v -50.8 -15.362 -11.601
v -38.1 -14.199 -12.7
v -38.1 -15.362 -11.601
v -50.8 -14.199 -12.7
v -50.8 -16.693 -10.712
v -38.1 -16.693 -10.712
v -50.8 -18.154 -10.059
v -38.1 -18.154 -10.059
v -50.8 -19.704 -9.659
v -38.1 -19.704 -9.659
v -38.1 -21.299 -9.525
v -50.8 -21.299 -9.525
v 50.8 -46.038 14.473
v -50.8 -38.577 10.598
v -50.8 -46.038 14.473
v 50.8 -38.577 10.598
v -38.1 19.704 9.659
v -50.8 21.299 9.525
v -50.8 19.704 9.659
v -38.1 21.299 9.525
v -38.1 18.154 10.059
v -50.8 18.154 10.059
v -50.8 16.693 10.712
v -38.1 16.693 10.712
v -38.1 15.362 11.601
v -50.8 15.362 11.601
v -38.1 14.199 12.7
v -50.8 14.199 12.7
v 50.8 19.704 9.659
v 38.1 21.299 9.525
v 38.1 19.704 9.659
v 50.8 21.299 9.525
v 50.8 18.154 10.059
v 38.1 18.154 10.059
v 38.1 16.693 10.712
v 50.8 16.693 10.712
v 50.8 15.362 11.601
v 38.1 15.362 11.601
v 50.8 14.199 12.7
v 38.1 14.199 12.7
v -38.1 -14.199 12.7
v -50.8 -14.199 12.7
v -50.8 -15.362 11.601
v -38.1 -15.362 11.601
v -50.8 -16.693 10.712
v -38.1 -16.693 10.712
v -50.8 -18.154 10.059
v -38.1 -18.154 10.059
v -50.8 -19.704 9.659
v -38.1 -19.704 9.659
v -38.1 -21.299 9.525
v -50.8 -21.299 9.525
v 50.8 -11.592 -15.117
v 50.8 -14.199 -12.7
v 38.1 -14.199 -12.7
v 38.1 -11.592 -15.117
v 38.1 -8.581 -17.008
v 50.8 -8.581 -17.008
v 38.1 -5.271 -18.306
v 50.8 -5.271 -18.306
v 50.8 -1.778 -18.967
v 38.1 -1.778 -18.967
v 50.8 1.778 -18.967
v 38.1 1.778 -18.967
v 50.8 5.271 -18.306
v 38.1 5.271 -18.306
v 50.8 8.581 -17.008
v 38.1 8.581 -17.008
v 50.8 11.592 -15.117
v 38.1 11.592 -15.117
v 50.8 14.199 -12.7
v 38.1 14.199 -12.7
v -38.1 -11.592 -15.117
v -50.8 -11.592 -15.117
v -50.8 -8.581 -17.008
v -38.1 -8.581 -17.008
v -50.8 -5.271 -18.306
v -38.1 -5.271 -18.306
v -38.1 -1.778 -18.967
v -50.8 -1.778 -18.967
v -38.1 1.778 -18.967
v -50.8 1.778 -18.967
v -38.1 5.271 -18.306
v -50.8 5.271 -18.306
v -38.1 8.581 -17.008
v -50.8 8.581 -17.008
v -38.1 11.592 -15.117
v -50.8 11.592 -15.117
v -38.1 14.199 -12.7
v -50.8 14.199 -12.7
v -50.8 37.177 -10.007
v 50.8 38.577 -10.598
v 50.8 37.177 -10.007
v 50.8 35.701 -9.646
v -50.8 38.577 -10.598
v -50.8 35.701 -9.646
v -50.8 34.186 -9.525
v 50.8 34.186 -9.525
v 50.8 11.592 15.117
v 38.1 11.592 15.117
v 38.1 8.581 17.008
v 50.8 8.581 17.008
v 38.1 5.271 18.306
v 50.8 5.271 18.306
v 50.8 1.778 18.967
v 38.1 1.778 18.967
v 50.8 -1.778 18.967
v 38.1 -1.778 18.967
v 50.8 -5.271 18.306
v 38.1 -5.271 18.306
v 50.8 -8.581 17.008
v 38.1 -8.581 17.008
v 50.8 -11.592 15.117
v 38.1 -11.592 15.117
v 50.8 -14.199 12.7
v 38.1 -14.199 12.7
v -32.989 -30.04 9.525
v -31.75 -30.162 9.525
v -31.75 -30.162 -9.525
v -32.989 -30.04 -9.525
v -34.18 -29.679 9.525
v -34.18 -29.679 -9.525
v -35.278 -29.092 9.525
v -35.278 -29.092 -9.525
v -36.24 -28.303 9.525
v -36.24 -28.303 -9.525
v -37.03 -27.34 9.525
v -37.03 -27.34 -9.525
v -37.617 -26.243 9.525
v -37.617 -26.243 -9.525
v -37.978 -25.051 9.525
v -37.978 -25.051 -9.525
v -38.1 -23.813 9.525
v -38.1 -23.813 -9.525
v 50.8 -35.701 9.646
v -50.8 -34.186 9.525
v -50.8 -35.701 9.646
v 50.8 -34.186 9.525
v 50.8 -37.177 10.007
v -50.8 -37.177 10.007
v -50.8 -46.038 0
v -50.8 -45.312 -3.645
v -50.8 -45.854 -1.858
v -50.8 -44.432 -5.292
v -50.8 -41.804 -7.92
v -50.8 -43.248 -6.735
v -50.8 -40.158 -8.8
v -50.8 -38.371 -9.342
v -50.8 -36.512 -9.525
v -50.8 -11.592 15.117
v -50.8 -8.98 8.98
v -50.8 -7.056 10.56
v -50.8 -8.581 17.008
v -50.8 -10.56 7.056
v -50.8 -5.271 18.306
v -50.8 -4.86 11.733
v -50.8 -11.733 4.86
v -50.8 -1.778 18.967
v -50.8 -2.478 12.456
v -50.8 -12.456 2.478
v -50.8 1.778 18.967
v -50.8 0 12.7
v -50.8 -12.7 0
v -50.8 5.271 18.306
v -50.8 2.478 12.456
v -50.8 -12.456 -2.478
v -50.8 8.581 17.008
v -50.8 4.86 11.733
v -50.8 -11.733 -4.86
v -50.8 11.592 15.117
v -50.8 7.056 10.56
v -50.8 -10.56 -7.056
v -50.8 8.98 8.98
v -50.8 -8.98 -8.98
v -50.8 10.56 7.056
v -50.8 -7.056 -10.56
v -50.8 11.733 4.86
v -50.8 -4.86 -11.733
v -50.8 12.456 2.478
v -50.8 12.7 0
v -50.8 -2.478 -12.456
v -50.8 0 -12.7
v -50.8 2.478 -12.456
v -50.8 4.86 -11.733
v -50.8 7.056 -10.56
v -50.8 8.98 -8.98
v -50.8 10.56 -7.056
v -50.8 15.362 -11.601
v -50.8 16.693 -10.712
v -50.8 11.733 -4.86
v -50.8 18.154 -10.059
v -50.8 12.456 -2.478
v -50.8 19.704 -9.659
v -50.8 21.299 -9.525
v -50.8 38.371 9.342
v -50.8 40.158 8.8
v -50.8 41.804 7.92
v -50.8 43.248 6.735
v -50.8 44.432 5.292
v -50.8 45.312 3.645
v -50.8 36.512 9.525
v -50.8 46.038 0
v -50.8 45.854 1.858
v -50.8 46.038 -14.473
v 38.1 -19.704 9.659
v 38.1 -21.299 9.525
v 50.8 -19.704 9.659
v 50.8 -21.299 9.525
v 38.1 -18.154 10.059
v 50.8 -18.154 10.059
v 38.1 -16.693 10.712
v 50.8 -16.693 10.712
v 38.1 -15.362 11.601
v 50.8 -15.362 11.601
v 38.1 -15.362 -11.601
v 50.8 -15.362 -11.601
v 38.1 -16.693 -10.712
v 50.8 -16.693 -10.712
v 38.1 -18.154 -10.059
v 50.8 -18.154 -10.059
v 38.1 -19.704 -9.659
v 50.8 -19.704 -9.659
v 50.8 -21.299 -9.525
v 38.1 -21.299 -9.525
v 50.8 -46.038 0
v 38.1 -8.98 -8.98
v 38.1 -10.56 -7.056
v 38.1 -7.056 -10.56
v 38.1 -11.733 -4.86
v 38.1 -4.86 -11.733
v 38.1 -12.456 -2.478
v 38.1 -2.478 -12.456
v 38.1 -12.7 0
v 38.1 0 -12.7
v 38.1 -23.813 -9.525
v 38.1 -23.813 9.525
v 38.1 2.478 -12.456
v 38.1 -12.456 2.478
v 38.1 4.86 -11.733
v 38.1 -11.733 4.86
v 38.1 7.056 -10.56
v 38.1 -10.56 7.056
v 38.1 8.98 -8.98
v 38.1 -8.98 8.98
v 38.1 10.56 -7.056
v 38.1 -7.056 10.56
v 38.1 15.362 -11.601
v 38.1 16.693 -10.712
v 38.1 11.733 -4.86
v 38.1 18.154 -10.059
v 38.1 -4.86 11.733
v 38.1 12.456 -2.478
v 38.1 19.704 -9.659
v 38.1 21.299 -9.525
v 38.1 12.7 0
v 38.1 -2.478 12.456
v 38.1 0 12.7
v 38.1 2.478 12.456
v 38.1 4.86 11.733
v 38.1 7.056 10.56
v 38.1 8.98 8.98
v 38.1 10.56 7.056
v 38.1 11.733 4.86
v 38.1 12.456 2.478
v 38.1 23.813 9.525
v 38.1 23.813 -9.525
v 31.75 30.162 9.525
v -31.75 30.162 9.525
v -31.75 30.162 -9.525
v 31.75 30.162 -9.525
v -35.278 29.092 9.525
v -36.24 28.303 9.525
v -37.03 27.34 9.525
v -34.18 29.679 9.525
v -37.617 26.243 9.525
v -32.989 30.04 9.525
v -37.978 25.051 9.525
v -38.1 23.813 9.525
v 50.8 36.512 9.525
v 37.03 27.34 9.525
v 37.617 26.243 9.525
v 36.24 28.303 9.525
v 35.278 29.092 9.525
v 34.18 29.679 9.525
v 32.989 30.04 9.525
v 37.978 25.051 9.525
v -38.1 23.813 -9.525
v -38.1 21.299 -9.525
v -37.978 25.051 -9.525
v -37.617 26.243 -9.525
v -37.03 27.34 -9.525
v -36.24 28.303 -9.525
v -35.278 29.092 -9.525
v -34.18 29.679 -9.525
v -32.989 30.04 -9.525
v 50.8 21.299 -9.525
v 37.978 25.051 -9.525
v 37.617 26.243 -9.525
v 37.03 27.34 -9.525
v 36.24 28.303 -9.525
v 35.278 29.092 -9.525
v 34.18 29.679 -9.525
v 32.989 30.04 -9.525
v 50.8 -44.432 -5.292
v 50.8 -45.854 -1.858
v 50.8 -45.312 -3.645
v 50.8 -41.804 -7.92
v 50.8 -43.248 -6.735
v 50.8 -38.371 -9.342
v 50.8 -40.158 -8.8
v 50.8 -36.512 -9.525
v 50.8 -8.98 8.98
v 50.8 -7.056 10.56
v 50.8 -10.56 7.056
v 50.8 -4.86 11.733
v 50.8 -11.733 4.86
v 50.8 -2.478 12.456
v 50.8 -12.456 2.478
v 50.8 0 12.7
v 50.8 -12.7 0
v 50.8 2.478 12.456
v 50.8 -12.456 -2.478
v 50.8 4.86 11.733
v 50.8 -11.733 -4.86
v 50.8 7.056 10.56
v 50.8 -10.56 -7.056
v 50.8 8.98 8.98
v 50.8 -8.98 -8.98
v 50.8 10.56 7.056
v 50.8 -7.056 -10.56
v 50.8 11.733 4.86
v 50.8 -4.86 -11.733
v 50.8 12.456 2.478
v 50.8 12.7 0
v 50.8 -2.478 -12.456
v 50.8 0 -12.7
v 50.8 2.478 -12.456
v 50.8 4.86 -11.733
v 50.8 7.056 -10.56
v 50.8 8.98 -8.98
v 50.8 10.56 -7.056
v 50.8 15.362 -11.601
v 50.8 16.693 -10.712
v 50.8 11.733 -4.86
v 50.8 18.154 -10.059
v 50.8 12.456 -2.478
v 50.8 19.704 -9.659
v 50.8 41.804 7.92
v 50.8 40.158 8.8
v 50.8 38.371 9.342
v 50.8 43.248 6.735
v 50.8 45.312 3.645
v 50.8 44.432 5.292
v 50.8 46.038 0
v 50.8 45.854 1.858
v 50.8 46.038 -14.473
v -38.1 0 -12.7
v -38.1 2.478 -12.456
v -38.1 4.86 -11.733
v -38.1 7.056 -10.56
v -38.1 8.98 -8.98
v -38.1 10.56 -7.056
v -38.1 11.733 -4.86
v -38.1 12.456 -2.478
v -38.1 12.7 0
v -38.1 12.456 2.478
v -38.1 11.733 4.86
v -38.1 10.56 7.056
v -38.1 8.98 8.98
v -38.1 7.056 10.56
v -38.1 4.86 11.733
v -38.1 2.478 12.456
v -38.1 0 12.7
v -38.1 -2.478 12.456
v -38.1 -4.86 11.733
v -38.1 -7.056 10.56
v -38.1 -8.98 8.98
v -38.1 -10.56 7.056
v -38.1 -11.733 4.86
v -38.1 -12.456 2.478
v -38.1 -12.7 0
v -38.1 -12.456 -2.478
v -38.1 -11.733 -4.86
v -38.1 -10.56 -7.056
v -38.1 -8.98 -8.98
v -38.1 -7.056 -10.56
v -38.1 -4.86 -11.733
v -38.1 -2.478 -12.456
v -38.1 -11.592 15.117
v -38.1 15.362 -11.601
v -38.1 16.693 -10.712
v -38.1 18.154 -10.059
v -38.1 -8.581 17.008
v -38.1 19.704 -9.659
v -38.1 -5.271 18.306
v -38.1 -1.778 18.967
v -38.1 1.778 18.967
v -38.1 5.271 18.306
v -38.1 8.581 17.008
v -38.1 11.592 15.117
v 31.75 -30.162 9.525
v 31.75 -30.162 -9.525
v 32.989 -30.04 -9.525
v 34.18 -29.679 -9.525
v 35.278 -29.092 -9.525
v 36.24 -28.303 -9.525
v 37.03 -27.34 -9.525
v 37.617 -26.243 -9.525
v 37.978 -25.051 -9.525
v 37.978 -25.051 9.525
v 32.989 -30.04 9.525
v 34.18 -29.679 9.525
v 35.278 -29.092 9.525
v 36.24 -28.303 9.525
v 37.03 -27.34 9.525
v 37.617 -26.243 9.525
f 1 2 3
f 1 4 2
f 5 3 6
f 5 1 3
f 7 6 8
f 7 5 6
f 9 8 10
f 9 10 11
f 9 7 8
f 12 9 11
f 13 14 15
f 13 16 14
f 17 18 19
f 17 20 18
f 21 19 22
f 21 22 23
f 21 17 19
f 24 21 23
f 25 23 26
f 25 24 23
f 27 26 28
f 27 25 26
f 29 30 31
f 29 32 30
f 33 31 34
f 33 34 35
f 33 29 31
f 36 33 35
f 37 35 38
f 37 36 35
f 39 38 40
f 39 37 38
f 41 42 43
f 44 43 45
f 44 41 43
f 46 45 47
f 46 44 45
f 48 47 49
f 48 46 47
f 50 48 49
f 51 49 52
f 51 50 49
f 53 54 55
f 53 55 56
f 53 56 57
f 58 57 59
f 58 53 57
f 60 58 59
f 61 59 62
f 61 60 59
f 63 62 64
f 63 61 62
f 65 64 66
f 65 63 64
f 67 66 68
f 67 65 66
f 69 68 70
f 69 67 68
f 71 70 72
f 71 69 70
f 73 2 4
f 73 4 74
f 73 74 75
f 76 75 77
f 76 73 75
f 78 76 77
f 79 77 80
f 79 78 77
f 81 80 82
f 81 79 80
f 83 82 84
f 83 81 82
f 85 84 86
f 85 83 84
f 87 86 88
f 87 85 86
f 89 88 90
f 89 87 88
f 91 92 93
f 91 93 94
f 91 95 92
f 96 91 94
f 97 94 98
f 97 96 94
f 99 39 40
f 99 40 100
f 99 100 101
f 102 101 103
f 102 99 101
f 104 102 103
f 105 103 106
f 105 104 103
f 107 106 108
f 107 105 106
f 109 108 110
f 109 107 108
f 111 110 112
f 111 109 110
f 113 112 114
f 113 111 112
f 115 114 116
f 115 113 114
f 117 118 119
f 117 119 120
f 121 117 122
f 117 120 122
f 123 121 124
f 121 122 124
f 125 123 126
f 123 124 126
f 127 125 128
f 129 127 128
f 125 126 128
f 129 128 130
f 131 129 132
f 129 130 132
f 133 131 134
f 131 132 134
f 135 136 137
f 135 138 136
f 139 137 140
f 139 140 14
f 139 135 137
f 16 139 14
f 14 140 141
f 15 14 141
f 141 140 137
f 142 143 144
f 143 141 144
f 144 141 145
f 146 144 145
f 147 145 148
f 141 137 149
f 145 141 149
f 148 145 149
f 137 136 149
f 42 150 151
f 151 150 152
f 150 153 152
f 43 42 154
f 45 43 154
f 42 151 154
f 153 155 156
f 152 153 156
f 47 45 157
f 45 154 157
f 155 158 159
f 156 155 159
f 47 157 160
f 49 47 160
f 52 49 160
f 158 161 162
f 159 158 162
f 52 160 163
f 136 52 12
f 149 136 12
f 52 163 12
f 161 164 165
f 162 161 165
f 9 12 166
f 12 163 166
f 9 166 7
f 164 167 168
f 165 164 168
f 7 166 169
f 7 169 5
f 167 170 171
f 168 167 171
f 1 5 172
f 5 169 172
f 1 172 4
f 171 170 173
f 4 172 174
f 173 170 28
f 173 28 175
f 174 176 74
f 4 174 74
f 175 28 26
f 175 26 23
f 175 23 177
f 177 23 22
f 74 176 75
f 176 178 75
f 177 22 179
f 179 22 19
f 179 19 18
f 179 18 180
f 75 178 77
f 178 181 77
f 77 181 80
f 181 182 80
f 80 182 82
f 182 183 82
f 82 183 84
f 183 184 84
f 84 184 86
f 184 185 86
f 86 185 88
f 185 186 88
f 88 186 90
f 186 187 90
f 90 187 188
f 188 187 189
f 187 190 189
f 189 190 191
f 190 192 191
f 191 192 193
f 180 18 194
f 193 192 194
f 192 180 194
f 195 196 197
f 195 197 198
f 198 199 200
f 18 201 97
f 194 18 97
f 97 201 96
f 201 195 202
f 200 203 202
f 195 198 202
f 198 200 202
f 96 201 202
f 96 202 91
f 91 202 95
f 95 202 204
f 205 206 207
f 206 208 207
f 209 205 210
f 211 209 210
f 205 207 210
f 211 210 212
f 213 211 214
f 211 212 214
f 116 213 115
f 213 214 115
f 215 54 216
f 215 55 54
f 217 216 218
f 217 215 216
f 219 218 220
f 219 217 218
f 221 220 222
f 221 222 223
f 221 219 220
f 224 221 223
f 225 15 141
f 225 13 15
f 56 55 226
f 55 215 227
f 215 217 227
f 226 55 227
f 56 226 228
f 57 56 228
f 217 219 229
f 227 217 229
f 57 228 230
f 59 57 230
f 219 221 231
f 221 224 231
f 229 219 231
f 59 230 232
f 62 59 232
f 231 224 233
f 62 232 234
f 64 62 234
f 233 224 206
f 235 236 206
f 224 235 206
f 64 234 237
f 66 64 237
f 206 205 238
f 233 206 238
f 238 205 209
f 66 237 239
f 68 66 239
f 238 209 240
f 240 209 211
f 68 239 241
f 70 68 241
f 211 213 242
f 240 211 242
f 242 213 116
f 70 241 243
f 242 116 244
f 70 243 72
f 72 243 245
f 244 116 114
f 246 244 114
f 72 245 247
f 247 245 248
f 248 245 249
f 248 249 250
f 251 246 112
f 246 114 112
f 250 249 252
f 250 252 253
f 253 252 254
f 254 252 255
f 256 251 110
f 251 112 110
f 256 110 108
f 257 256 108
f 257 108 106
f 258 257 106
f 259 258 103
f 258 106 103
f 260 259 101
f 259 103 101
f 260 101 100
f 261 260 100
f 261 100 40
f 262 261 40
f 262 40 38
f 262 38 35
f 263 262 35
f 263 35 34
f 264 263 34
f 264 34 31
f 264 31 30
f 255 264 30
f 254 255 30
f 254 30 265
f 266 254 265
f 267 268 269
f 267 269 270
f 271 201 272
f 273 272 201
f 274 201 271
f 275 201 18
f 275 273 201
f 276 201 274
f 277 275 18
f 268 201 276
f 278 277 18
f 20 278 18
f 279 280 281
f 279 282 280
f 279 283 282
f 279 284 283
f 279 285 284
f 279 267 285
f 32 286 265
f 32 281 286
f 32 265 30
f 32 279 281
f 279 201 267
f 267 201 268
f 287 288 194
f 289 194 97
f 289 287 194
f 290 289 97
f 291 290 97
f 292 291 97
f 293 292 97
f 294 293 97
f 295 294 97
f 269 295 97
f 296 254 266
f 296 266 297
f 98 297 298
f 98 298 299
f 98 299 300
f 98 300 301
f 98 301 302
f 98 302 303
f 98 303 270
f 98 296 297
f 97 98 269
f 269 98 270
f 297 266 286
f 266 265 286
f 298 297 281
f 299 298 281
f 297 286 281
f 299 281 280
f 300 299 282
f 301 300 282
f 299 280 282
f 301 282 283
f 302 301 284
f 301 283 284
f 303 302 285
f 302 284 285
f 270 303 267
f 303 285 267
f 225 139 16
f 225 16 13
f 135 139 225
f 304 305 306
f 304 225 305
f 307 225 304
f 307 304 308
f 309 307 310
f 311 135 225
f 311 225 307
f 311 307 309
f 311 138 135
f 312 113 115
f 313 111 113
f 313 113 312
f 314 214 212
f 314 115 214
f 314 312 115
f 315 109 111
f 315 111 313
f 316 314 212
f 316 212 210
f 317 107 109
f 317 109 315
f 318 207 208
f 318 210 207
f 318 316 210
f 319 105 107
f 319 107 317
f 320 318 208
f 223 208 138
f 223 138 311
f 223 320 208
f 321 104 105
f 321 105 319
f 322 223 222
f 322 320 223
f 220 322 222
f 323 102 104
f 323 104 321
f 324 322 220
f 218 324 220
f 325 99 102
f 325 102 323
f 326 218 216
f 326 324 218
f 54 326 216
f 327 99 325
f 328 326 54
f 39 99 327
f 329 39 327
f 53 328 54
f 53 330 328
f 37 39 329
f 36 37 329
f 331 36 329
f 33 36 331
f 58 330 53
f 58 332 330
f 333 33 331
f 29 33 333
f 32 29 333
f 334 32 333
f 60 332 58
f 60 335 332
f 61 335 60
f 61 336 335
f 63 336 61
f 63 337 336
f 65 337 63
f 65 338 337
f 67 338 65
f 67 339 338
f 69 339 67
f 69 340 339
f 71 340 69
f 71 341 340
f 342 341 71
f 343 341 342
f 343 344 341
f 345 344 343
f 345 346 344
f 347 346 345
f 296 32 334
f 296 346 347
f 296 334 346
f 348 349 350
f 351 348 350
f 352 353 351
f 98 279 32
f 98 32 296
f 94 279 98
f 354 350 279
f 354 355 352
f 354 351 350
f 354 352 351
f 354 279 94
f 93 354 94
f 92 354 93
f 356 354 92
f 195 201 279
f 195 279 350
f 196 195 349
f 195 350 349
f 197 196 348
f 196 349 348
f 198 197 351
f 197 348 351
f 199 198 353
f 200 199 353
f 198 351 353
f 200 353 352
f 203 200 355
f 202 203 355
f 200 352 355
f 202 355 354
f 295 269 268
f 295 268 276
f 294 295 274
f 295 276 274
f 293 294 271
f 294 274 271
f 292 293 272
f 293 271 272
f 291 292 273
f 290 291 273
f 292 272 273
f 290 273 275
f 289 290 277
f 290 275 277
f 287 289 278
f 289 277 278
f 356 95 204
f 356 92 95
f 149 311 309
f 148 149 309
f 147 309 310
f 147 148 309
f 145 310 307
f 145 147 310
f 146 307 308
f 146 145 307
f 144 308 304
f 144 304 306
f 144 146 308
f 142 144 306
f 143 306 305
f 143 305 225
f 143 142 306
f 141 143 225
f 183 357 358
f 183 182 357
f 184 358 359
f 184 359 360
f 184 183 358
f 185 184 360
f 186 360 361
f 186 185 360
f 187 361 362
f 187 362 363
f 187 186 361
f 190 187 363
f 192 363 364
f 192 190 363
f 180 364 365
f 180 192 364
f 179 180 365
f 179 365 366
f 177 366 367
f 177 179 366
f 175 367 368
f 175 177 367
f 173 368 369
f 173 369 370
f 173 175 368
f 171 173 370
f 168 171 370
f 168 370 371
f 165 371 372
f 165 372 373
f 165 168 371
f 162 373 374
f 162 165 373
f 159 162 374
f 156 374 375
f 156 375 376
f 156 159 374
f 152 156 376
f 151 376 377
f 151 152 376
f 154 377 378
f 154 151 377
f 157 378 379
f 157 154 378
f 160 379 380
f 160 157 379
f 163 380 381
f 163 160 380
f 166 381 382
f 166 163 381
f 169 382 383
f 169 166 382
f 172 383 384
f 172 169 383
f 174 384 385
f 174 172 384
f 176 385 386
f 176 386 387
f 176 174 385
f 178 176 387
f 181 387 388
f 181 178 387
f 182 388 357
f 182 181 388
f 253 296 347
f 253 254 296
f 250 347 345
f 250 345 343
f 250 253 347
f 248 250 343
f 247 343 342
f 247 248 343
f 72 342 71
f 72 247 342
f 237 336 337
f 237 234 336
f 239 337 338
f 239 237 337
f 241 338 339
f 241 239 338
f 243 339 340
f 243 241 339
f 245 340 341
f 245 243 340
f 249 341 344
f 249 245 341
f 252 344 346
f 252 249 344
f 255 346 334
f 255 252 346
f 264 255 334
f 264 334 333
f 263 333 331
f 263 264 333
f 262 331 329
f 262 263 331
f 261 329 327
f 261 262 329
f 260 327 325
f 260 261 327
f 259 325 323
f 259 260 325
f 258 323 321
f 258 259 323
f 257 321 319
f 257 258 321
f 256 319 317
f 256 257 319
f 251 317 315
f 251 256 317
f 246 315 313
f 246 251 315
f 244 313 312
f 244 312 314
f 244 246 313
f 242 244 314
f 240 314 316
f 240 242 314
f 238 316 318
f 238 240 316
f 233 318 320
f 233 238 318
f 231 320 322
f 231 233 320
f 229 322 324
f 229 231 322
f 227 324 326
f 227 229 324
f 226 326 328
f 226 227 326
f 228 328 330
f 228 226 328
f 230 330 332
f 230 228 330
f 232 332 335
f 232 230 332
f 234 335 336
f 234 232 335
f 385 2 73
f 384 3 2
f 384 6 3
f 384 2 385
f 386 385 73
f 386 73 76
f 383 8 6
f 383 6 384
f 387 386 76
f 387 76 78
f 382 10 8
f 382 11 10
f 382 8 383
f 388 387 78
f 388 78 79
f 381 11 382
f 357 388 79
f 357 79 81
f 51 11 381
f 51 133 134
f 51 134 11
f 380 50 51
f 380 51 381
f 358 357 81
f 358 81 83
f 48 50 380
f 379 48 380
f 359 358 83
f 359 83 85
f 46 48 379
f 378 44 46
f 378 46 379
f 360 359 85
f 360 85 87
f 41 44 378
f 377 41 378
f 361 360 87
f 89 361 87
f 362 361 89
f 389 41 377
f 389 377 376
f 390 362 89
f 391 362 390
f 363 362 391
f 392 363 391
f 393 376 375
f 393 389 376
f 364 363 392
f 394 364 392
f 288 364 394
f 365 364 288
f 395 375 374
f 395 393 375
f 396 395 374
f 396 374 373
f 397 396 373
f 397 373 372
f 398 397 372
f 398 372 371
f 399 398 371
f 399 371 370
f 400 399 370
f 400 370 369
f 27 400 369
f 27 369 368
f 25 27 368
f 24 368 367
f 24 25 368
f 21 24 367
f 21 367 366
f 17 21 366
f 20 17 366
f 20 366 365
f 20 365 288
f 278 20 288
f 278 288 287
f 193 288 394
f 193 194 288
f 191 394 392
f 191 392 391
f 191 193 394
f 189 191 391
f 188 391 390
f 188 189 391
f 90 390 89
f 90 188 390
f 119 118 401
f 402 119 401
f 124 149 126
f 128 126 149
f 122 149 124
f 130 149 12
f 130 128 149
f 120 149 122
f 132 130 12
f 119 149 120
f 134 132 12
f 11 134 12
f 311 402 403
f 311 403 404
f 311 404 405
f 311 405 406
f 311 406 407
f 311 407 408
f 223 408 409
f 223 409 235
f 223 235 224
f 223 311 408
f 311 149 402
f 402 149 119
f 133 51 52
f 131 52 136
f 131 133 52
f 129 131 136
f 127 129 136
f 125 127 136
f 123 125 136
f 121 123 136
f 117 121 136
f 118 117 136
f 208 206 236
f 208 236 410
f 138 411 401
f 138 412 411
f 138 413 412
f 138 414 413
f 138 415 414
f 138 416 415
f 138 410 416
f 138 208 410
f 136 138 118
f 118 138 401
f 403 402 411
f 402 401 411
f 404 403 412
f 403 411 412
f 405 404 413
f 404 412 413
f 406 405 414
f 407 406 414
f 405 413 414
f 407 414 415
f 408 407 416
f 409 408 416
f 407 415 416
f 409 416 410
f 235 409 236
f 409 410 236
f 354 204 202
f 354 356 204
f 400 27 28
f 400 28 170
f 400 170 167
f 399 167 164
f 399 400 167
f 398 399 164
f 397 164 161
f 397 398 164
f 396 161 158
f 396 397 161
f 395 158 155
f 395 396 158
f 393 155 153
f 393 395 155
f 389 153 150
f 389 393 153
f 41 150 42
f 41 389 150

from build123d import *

# Parameters (mm, degrees)
SKETCH1_R               = 12.7
BOSS_EXTRUDE1_DEPTH     = 50.8
SKETCH2_W               = 76.2
SKETCH2_H               = 60.325
CUT_EXTRUDE1_DEPTH      = 20.05
CUT_EXTRUDE1_DEPTH_BACK = 20.05
FILLET1_R               = 6.35
FILLET2_R               = 9.525
FILLET3_R               = 9.525
FILLET4_R               = 9.525


with BuildPart() as part:
    # Sketch1 → Boss-Extrude1 (new body, symmetric)
    with BuildSketch(Plane(origin=(0, 0, 0), x_dir=(0, 0, -1), z_dir=(1, 0, 0))):
        with BuildLine():
            Line((9.525, 36.5125), (14.473290811, 46.0375))
            Line((14.473290811, 46.0375), (-9.525, 46.0375))
            Line((-9.525, 46.0375), (-9.525, 36.5125))
            Line((-9.525, 36.5125), (-9.525, 16.497783942))
            ThreePointArc((-9.525, 16.497783942), (-19.05, 0), (-9.525, -16.497783942))
            Line((-9.525, -16.497783942), (-9.525, -36.5125))
            Line((-9.525, -36.5125), (-14.473290811, -46.0375))
            Line((-14.473290811, -46.0375), (9.525, -46.0375))
            Line((9.525, -46.0375), (9.525, -36.5125))
            Line((9.525, -36.5125), (9.525, -16.497783942))
            ThreePointArc((9.525, -16.497783942), (19.05, 0), (9.525, 16.497783942))
            Line((9.525, 16.497783942), (9.525, 36.5125))
        make_face()
        Circle(SKETCH1_R, mode=Mode.SUBTRACT)
    extrude(amount=BOSS_EXTRUDE1_DEPTH, both=True)

    # Sketch2 → Cut-Extrude1 (cut, two sides)
    with BuildSketch(Plane.XY) as cut_extrude1_sk:
        Rectangle(SKETCH2_W, SKETCH2_H)
    extrude(amount=CUT_EXTRUDE1_DEPTH, mode=Mode.SUBTRACT)
    extrude(cut_extrude1_sk.sketch, amount=-CUT_EXTRUDE1_DEPTH_BACK, mode=Mode.SUBTRACT)

    # Fillet1
    fillet1_edges = [part.edges().sort_by_distance(p)[0] for p in [
        (-38.1, 30.1625, 0),
        (38.1, -30.1625, 0),
        (38.1, 30.1625, 0),
        (-38.1, -30.1625, 0),
    ]]
    fillet(fillet1_edges, radius=FILLET1_R)

    # Fillet2
    fillet2_edges = [part.edges().sort_by_distance(p)[0] for p in [
        (44.45, 16.497783942, -9.525),
        (44.45, -16.497783942, -9.525),
        (44.45, -16.497783942, 9.525),
        (44.45, 16.497783942, 9.525),
        (-44.45, 16.497783942, -9.525),
        (-44.45, -16.497783942, -9.525),
        (-44.45, -16.497783942, 9.525),
        (-44.45, 16.497783942, 9.525),
    ]]
    fillet(fillet2_edges, radius=FILLET2_R)

    # Fillet3
    fillet3_edges = [part.edges().sort_by_distance(p)[0] for p in [
        (0, -46.0375, -9.525),
        (0, 46.0375, 9.525),
    ]]
    fillet(fillet3_edges, radius=FILLET3_R)

    # Fillet4
    fillet4_edges = [part.edges().sort_by_distance(p)[0] for p in [
        (0, -36.5125, 9.525),
        (0, 36.5125, -9.525),
    ]]
    fillet(fillet4_edges, radius=FILLET4_R)


solid = part.part
